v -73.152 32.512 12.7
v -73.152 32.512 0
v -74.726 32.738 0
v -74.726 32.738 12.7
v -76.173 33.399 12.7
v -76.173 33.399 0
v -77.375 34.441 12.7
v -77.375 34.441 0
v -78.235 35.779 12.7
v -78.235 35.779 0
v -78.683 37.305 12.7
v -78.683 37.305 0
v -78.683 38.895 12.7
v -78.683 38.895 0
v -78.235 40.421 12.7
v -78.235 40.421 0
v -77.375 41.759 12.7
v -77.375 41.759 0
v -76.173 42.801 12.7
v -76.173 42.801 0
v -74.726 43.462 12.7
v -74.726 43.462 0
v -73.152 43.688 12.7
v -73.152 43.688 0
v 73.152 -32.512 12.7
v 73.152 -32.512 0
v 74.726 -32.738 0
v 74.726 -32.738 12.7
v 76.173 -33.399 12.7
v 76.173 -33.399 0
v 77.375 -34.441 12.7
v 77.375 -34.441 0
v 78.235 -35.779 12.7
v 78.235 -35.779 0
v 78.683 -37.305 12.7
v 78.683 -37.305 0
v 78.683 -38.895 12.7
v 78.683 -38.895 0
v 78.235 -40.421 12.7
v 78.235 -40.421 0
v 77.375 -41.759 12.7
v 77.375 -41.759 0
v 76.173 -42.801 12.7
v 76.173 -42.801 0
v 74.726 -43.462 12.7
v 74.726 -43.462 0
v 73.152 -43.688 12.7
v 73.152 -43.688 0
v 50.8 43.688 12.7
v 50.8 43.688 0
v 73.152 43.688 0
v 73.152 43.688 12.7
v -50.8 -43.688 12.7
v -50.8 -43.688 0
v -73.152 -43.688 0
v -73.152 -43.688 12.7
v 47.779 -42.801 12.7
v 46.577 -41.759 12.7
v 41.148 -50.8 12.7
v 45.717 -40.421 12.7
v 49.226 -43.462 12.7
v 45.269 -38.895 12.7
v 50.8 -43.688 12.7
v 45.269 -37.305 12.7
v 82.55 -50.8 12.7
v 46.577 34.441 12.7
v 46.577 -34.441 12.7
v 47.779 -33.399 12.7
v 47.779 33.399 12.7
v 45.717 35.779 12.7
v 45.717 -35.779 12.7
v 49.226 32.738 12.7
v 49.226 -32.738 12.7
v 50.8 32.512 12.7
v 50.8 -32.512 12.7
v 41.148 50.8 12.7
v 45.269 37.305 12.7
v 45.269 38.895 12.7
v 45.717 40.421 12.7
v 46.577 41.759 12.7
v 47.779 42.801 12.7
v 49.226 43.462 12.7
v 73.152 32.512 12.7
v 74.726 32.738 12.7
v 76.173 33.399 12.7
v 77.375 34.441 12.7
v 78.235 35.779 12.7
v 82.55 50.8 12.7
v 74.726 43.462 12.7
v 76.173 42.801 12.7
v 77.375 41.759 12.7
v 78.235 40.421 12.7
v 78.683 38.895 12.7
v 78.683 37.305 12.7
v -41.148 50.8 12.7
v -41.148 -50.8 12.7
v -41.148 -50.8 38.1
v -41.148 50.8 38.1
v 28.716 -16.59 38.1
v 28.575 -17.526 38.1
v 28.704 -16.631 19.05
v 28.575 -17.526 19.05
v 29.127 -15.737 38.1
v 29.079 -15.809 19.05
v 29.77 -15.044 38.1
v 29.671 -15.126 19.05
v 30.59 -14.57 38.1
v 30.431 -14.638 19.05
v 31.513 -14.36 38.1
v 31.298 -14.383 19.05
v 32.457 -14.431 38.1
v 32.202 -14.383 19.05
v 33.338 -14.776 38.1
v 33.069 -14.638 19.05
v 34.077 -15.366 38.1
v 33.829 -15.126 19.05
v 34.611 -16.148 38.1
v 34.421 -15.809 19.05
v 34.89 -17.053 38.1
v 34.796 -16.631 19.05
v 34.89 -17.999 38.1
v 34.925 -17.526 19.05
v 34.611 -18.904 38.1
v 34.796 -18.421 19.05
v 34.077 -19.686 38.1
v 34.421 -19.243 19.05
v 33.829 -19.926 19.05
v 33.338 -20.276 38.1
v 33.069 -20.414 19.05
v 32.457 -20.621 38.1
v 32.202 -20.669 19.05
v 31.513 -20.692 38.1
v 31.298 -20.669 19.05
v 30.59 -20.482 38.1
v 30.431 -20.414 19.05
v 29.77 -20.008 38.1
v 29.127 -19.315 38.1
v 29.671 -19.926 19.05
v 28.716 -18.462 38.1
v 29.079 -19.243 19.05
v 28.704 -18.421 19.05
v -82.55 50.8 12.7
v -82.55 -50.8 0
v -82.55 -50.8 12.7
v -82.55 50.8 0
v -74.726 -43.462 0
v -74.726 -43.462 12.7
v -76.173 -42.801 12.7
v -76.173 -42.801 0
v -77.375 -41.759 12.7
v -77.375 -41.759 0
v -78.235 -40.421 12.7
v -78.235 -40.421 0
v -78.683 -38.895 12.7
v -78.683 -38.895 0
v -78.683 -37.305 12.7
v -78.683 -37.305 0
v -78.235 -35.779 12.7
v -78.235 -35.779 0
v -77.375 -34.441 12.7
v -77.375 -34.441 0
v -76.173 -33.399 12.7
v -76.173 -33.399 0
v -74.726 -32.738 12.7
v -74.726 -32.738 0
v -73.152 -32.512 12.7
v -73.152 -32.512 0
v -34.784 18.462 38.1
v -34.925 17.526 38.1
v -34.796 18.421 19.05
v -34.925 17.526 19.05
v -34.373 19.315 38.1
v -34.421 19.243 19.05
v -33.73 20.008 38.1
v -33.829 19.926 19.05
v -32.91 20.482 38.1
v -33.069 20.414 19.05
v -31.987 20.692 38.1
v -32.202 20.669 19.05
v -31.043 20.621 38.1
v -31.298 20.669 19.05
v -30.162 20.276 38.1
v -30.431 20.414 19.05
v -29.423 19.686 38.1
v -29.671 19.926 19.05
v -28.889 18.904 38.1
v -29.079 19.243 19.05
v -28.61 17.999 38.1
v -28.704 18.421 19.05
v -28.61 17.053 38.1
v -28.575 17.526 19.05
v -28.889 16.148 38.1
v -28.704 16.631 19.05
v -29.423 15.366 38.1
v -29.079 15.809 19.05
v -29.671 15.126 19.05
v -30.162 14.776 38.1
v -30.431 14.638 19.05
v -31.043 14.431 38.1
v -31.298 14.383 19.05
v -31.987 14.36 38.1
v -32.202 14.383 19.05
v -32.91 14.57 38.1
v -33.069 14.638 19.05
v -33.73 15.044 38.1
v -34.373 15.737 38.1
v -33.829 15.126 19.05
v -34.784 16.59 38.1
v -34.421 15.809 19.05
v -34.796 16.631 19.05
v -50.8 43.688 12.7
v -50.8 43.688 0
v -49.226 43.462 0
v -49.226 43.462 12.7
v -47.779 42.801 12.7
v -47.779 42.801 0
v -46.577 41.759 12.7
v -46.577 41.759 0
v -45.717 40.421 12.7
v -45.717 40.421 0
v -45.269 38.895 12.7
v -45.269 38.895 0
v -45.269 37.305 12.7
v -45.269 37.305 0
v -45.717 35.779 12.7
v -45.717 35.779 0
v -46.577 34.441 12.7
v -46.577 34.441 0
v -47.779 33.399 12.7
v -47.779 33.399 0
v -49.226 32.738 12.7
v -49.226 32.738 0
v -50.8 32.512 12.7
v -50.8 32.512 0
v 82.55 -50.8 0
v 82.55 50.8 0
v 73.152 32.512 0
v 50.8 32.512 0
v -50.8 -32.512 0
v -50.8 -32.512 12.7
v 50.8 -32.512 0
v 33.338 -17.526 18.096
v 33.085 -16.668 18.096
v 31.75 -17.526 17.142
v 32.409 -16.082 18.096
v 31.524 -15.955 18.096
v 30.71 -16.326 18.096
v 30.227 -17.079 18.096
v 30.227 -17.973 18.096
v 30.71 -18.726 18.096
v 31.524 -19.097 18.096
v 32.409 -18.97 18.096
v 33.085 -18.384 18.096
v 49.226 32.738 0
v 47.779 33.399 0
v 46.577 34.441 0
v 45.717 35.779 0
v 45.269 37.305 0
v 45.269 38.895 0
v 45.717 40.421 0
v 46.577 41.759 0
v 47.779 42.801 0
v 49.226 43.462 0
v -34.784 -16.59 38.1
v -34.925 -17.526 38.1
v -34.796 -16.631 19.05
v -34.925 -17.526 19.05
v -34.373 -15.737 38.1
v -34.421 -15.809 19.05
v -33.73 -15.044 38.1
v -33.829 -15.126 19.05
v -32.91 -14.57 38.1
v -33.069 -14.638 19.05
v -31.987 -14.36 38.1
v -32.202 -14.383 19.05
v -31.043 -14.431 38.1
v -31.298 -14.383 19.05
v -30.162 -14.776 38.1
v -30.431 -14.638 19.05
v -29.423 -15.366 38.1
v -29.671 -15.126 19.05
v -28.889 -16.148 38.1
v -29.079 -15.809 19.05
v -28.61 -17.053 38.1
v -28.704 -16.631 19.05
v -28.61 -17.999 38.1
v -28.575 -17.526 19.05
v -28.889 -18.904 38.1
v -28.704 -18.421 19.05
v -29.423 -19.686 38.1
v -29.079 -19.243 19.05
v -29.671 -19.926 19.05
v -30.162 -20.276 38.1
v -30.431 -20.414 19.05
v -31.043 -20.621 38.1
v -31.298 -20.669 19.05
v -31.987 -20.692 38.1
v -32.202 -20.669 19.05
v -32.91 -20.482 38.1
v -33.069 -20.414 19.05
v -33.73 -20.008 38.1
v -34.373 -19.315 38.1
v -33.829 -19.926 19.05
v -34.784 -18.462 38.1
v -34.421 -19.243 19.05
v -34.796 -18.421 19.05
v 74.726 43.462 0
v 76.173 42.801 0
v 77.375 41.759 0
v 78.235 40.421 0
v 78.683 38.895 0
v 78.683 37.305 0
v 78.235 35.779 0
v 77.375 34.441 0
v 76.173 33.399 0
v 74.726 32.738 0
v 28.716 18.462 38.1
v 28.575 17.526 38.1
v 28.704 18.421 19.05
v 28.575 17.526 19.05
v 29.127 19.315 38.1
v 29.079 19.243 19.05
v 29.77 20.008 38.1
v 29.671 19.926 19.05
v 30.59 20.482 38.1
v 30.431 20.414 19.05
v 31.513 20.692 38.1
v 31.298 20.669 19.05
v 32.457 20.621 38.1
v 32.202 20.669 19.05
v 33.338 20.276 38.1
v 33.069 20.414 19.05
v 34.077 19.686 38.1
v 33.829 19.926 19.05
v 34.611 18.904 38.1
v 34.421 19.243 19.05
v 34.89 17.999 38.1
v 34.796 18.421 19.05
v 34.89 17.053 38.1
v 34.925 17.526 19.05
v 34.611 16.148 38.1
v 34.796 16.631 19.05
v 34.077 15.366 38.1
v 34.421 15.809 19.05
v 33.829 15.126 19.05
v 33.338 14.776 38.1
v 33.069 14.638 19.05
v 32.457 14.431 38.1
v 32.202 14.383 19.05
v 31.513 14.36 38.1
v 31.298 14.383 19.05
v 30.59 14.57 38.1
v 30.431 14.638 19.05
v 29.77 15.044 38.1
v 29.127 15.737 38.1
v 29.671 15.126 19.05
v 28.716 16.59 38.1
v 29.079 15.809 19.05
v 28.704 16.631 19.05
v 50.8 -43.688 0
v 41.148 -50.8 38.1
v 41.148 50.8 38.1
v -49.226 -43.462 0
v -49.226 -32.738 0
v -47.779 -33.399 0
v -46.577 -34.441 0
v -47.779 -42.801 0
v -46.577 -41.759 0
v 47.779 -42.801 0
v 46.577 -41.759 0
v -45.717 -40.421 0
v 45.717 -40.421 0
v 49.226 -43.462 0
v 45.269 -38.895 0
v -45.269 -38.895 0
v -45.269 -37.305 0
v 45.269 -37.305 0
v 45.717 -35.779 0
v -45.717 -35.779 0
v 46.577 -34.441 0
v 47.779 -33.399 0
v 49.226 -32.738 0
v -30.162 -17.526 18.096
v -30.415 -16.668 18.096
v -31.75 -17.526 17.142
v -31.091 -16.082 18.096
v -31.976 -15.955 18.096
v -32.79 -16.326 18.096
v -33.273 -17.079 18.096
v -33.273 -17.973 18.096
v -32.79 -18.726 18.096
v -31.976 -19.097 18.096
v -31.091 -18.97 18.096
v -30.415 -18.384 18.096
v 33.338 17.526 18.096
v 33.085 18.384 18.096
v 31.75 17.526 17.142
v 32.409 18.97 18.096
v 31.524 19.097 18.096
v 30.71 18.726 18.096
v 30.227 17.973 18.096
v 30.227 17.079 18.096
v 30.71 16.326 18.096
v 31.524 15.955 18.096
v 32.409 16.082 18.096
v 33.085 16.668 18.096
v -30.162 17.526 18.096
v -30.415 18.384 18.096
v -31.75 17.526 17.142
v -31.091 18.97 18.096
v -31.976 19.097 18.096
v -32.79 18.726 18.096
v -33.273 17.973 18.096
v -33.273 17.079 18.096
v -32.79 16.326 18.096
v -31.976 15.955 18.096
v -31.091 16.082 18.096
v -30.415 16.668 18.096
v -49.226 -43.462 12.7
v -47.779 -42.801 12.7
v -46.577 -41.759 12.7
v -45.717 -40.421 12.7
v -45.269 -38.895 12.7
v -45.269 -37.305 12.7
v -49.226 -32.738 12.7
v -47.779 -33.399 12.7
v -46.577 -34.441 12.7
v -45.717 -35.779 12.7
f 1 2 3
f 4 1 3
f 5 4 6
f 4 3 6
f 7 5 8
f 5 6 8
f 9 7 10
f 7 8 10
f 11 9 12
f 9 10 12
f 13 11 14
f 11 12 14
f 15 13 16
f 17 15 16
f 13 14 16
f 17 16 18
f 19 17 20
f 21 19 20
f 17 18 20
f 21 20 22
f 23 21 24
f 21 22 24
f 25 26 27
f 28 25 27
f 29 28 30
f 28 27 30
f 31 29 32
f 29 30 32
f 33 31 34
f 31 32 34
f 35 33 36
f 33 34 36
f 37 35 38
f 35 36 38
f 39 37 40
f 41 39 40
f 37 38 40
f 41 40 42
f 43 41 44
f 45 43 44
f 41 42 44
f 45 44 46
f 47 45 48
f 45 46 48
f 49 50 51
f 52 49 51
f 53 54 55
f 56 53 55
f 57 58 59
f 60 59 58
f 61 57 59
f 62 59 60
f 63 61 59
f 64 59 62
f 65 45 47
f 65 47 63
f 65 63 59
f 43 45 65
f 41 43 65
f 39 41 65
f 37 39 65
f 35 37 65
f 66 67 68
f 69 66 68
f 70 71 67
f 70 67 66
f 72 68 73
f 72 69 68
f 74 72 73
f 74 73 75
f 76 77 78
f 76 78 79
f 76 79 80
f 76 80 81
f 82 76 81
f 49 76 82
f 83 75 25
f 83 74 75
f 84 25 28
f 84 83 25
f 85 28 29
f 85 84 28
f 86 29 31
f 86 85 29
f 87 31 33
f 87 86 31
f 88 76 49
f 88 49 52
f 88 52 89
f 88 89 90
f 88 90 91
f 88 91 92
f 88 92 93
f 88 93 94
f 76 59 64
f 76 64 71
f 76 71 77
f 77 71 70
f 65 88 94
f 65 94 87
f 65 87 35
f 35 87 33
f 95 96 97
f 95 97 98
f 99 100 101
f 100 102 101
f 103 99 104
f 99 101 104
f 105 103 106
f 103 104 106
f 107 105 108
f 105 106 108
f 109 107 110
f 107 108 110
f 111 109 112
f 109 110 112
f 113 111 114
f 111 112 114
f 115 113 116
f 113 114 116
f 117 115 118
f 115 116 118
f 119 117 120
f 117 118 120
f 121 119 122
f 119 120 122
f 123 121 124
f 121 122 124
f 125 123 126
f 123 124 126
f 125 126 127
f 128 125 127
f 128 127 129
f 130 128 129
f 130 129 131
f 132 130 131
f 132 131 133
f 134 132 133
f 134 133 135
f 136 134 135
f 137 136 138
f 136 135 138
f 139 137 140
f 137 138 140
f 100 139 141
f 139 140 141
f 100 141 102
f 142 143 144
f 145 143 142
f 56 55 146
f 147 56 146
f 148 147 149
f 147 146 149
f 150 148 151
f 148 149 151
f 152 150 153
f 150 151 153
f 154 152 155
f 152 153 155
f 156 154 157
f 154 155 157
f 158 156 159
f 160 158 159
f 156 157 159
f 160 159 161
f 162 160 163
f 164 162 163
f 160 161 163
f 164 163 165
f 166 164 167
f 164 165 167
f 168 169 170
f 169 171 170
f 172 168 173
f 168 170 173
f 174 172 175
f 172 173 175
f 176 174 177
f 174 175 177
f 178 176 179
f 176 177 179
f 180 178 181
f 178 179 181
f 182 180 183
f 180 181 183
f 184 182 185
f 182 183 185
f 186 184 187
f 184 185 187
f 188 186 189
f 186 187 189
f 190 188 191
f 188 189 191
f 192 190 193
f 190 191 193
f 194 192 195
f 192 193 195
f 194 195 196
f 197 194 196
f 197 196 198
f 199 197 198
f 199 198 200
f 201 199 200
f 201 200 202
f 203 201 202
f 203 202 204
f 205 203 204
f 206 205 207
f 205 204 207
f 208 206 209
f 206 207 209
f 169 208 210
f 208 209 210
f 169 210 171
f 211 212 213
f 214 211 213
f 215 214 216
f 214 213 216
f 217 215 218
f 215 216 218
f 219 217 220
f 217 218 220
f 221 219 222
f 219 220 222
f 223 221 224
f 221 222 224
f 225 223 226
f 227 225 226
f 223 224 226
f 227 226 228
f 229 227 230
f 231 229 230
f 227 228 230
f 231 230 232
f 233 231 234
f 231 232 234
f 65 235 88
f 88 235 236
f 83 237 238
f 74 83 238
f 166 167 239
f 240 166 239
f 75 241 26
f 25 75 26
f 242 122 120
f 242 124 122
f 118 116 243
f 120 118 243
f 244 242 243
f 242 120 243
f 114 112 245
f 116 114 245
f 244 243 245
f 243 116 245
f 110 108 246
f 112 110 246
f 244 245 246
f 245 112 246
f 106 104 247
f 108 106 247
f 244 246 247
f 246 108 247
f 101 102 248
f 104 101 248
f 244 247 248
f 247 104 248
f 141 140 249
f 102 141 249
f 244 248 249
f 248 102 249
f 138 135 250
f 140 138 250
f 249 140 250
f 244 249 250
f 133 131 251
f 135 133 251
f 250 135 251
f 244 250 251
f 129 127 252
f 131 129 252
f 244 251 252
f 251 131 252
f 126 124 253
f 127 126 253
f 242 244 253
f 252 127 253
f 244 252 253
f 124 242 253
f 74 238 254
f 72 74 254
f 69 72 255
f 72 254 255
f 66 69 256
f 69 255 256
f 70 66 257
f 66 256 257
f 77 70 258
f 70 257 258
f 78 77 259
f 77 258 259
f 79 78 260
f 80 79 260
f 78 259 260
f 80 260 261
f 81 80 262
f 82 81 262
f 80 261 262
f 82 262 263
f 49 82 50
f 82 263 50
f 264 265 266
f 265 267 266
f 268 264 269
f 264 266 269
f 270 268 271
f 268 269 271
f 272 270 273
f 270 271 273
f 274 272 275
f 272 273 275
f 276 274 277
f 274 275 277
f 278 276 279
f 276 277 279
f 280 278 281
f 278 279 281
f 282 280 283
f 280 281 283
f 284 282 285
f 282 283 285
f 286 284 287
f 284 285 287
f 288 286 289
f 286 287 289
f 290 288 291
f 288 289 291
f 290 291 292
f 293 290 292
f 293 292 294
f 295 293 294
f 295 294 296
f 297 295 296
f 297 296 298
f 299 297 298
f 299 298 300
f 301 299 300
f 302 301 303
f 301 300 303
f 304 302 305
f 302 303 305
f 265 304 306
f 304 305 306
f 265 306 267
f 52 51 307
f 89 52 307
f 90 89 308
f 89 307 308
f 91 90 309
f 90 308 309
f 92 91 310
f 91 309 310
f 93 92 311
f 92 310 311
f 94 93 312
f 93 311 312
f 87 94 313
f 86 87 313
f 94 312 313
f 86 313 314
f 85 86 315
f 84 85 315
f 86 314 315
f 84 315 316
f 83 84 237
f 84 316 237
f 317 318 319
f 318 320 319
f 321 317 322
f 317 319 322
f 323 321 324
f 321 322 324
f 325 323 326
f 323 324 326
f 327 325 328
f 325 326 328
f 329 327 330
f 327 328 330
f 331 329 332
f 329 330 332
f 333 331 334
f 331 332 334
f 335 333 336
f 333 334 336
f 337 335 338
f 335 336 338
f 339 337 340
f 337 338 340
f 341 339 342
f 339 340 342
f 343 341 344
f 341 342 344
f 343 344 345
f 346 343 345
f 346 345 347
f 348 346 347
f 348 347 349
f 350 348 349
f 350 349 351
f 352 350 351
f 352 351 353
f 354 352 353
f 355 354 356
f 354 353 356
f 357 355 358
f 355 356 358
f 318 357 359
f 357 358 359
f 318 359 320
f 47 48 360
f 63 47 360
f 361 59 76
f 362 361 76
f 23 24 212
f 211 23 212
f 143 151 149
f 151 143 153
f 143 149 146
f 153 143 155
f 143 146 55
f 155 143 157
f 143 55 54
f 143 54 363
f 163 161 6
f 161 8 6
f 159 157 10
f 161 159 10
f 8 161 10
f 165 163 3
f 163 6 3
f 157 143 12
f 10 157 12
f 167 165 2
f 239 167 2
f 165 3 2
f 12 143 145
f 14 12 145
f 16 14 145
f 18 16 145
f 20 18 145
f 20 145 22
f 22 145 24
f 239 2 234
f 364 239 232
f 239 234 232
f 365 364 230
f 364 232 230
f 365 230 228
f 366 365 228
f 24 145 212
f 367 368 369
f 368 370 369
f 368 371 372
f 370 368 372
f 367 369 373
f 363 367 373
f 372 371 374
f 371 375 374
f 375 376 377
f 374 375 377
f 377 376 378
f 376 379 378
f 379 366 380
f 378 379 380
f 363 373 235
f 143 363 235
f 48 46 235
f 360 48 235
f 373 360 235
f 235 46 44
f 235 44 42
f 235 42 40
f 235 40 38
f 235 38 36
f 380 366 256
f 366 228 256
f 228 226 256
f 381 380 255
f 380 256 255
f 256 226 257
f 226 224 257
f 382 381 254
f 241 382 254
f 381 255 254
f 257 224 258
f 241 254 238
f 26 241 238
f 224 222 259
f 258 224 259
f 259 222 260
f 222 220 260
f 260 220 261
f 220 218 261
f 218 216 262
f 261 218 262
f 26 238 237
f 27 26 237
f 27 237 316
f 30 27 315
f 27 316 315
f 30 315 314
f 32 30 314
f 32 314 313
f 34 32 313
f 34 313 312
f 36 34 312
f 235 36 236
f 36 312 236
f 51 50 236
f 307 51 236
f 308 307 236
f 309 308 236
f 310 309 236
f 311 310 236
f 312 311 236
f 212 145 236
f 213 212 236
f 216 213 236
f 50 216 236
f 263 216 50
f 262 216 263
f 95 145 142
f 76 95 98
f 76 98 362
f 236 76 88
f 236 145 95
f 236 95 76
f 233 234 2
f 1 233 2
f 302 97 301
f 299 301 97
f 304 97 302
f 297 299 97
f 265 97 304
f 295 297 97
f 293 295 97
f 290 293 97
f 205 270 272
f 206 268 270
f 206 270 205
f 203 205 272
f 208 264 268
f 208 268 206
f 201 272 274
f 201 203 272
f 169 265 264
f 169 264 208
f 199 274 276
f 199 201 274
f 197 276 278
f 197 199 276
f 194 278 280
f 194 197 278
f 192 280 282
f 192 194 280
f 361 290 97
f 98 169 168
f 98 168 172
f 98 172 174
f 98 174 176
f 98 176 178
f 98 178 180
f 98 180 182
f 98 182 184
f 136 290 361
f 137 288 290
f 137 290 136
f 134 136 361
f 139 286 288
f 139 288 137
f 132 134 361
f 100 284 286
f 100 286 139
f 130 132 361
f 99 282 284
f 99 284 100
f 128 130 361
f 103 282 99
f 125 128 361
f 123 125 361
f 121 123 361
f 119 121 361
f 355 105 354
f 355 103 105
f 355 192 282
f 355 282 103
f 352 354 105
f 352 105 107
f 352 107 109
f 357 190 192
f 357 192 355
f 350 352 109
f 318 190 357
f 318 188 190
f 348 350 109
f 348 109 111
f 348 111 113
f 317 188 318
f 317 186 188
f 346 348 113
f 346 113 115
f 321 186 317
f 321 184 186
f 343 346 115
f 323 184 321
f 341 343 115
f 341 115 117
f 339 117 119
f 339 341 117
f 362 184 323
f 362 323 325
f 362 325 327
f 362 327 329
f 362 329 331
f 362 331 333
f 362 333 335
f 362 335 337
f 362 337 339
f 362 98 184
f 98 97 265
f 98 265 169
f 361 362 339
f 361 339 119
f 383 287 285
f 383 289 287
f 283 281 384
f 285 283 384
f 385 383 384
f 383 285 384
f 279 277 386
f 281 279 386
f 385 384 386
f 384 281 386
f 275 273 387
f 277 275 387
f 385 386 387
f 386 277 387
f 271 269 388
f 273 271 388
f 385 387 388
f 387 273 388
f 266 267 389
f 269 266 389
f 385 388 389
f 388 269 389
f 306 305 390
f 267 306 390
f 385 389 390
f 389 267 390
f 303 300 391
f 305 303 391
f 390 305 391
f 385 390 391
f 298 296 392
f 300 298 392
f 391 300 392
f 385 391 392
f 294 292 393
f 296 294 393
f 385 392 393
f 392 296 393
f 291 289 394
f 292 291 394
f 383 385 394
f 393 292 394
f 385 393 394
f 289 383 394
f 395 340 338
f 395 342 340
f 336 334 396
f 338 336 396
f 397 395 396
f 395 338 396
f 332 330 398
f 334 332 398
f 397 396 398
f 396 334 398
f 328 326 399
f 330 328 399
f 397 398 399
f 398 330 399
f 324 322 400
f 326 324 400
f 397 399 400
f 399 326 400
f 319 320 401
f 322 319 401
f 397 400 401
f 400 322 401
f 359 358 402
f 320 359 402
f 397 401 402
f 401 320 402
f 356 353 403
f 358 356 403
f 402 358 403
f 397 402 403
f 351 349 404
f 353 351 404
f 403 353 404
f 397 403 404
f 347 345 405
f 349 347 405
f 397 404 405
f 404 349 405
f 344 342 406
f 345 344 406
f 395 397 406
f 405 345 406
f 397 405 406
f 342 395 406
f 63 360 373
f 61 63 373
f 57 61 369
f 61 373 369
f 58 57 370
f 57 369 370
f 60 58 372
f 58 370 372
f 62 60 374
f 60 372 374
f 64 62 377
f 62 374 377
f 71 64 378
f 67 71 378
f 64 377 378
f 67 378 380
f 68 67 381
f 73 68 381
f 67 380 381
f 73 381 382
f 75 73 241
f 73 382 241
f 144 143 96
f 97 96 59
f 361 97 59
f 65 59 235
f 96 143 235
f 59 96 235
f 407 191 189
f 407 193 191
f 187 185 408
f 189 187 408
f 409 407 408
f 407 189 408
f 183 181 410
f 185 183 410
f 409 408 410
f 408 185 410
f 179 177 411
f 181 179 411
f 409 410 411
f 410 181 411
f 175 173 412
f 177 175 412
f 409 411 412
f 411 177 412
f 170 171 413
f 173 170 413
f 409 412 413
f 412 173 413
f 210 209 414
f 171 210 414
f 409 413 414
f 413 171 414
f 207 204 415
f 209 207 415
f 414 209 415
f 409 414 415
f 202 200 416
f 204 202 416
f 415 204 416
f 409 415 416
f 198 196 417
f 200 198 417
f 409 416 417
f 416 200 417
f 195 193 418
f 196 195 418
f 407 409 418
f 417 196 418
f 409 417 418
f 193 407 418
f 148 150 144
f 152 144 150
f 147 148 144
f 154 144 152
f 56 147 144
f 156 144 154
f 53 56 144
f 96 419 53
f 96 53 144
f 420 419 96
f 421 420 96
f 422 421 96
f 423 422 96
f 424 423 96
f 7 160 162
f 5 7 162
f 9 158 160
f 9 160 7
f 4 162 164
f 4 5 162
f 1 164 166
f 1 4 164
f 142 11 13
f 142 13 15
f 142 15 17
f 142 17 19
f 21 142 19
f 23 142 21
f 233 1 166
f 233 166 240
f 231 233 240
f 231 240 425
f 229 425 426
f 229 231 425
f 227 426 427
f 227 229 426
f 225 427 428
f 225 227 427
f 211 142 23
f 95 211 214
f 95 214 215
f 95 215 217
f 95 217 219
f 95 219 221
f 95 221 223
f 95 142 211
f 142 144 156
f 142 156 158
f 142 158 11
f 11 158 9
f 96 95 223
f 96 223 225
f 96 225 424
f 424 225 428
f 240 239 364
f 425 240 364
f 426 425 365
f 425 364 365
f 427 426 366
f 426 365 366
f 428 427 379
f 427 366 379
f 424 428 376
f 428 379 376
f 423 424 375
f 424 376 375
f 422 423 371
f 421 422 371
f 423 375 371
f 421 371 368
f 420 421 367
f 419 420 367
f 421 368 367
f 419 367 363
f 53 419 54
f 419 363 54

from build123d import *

# Parameters (mm, degrees)
F0_W     = 165.1
F0_H     = 101.6
F1_DEPTH = 12.7
F2_W     = 82.296
F2_H     = 101.6
F3_DEPTH = 25.4
F5_D     = 6.35
F5_DEPTH = 19.05
F5_TIP   = 1.9077324654


with BuildPart() as f1:
    # F0 (on Top) → F1 (new body)
    with BuildSketch(Plane.XY):
        Rectangle(F0_W, F0_H)
        with BuildLine():
            ThreePointArc((-73.152, -43.688), (-78.74, -38.1), (-73.152, -32.512))
            Line((-73.152, -32.512), (-50.8, -32.512))
            ThreePointArc((-50.8, -32.512), (-45.212, -38.1), (-50.8, -43.688))
            Line((-50.8, -43.688), (-73.152, -43.688))
        make_face(mode=Mode.SUBTRACT)
        with BuildLine():
            ThreePointArc((73.152, -32.512), (78.74, -38.1), (73.152, -43.688))
            Line((73.152, -43.688), (50.8, -43.688))
            ThreePointArc((50.8, -43.688), (45.212, -38.1), (50.8, -32.512))
            Line((50.8, -32.512), (73.152, -32.512))
        make_face(mode=Mode.SUBTRACT)
        with BuildLine():
            Line((-50.8, 32.512), (-73.152, 32.512))
            ThreePointArc((-73.152, 32.512), (-78.74, 38.1), (-73.152, 43.688))
            Line((-73.152, 43.688), (-50.8, 43.688))
            ThreePointArc((-50.8, 43.688), (-45.212, 38.1), (-50.8, 32.512))
        make_face(mode=Mode.SUBTRACT)
        with BuildLine():
            ThreePointArc((50.8, 32.512), (45.212, 38.1), (50.8, 43.688))
            Line((50.8, 43.688), (73.152, 43.688))
            ThreePointArc((73.152, 43.688), (78.74, 38.1), (73.152, 32.512))
            Line((73.152, 32.512), (50.8, 32.512))
        make_face(mode=Mode.SUBTRACT)
    extrude(amount=F1_DEPTH)

    # F2 (on face) → F3 (join)
    with BuildSketch(Plane.XY.offset(12.7)):
        Rectangle(F2_W, F2_H)
    extrude(amount=F3_DEPTH)

    # F5
    with Locations(Plane.XY.offset(38.1)):
        with Locations((-31.75, 17.526), (-31.75, -17.526), (31.75, -17.526), (31.75, 17.526)):
            Hole(F5_D / 2, depth=F5_DEPTH)
            with Locations((0, 0, -(F5_DEPTH + F5_TIP / 2))):  # 118° drill point
                Cone(0, F5_D / 2, F5_TIP, mode=Mode.SUBTRACT)


solid = f1.part
